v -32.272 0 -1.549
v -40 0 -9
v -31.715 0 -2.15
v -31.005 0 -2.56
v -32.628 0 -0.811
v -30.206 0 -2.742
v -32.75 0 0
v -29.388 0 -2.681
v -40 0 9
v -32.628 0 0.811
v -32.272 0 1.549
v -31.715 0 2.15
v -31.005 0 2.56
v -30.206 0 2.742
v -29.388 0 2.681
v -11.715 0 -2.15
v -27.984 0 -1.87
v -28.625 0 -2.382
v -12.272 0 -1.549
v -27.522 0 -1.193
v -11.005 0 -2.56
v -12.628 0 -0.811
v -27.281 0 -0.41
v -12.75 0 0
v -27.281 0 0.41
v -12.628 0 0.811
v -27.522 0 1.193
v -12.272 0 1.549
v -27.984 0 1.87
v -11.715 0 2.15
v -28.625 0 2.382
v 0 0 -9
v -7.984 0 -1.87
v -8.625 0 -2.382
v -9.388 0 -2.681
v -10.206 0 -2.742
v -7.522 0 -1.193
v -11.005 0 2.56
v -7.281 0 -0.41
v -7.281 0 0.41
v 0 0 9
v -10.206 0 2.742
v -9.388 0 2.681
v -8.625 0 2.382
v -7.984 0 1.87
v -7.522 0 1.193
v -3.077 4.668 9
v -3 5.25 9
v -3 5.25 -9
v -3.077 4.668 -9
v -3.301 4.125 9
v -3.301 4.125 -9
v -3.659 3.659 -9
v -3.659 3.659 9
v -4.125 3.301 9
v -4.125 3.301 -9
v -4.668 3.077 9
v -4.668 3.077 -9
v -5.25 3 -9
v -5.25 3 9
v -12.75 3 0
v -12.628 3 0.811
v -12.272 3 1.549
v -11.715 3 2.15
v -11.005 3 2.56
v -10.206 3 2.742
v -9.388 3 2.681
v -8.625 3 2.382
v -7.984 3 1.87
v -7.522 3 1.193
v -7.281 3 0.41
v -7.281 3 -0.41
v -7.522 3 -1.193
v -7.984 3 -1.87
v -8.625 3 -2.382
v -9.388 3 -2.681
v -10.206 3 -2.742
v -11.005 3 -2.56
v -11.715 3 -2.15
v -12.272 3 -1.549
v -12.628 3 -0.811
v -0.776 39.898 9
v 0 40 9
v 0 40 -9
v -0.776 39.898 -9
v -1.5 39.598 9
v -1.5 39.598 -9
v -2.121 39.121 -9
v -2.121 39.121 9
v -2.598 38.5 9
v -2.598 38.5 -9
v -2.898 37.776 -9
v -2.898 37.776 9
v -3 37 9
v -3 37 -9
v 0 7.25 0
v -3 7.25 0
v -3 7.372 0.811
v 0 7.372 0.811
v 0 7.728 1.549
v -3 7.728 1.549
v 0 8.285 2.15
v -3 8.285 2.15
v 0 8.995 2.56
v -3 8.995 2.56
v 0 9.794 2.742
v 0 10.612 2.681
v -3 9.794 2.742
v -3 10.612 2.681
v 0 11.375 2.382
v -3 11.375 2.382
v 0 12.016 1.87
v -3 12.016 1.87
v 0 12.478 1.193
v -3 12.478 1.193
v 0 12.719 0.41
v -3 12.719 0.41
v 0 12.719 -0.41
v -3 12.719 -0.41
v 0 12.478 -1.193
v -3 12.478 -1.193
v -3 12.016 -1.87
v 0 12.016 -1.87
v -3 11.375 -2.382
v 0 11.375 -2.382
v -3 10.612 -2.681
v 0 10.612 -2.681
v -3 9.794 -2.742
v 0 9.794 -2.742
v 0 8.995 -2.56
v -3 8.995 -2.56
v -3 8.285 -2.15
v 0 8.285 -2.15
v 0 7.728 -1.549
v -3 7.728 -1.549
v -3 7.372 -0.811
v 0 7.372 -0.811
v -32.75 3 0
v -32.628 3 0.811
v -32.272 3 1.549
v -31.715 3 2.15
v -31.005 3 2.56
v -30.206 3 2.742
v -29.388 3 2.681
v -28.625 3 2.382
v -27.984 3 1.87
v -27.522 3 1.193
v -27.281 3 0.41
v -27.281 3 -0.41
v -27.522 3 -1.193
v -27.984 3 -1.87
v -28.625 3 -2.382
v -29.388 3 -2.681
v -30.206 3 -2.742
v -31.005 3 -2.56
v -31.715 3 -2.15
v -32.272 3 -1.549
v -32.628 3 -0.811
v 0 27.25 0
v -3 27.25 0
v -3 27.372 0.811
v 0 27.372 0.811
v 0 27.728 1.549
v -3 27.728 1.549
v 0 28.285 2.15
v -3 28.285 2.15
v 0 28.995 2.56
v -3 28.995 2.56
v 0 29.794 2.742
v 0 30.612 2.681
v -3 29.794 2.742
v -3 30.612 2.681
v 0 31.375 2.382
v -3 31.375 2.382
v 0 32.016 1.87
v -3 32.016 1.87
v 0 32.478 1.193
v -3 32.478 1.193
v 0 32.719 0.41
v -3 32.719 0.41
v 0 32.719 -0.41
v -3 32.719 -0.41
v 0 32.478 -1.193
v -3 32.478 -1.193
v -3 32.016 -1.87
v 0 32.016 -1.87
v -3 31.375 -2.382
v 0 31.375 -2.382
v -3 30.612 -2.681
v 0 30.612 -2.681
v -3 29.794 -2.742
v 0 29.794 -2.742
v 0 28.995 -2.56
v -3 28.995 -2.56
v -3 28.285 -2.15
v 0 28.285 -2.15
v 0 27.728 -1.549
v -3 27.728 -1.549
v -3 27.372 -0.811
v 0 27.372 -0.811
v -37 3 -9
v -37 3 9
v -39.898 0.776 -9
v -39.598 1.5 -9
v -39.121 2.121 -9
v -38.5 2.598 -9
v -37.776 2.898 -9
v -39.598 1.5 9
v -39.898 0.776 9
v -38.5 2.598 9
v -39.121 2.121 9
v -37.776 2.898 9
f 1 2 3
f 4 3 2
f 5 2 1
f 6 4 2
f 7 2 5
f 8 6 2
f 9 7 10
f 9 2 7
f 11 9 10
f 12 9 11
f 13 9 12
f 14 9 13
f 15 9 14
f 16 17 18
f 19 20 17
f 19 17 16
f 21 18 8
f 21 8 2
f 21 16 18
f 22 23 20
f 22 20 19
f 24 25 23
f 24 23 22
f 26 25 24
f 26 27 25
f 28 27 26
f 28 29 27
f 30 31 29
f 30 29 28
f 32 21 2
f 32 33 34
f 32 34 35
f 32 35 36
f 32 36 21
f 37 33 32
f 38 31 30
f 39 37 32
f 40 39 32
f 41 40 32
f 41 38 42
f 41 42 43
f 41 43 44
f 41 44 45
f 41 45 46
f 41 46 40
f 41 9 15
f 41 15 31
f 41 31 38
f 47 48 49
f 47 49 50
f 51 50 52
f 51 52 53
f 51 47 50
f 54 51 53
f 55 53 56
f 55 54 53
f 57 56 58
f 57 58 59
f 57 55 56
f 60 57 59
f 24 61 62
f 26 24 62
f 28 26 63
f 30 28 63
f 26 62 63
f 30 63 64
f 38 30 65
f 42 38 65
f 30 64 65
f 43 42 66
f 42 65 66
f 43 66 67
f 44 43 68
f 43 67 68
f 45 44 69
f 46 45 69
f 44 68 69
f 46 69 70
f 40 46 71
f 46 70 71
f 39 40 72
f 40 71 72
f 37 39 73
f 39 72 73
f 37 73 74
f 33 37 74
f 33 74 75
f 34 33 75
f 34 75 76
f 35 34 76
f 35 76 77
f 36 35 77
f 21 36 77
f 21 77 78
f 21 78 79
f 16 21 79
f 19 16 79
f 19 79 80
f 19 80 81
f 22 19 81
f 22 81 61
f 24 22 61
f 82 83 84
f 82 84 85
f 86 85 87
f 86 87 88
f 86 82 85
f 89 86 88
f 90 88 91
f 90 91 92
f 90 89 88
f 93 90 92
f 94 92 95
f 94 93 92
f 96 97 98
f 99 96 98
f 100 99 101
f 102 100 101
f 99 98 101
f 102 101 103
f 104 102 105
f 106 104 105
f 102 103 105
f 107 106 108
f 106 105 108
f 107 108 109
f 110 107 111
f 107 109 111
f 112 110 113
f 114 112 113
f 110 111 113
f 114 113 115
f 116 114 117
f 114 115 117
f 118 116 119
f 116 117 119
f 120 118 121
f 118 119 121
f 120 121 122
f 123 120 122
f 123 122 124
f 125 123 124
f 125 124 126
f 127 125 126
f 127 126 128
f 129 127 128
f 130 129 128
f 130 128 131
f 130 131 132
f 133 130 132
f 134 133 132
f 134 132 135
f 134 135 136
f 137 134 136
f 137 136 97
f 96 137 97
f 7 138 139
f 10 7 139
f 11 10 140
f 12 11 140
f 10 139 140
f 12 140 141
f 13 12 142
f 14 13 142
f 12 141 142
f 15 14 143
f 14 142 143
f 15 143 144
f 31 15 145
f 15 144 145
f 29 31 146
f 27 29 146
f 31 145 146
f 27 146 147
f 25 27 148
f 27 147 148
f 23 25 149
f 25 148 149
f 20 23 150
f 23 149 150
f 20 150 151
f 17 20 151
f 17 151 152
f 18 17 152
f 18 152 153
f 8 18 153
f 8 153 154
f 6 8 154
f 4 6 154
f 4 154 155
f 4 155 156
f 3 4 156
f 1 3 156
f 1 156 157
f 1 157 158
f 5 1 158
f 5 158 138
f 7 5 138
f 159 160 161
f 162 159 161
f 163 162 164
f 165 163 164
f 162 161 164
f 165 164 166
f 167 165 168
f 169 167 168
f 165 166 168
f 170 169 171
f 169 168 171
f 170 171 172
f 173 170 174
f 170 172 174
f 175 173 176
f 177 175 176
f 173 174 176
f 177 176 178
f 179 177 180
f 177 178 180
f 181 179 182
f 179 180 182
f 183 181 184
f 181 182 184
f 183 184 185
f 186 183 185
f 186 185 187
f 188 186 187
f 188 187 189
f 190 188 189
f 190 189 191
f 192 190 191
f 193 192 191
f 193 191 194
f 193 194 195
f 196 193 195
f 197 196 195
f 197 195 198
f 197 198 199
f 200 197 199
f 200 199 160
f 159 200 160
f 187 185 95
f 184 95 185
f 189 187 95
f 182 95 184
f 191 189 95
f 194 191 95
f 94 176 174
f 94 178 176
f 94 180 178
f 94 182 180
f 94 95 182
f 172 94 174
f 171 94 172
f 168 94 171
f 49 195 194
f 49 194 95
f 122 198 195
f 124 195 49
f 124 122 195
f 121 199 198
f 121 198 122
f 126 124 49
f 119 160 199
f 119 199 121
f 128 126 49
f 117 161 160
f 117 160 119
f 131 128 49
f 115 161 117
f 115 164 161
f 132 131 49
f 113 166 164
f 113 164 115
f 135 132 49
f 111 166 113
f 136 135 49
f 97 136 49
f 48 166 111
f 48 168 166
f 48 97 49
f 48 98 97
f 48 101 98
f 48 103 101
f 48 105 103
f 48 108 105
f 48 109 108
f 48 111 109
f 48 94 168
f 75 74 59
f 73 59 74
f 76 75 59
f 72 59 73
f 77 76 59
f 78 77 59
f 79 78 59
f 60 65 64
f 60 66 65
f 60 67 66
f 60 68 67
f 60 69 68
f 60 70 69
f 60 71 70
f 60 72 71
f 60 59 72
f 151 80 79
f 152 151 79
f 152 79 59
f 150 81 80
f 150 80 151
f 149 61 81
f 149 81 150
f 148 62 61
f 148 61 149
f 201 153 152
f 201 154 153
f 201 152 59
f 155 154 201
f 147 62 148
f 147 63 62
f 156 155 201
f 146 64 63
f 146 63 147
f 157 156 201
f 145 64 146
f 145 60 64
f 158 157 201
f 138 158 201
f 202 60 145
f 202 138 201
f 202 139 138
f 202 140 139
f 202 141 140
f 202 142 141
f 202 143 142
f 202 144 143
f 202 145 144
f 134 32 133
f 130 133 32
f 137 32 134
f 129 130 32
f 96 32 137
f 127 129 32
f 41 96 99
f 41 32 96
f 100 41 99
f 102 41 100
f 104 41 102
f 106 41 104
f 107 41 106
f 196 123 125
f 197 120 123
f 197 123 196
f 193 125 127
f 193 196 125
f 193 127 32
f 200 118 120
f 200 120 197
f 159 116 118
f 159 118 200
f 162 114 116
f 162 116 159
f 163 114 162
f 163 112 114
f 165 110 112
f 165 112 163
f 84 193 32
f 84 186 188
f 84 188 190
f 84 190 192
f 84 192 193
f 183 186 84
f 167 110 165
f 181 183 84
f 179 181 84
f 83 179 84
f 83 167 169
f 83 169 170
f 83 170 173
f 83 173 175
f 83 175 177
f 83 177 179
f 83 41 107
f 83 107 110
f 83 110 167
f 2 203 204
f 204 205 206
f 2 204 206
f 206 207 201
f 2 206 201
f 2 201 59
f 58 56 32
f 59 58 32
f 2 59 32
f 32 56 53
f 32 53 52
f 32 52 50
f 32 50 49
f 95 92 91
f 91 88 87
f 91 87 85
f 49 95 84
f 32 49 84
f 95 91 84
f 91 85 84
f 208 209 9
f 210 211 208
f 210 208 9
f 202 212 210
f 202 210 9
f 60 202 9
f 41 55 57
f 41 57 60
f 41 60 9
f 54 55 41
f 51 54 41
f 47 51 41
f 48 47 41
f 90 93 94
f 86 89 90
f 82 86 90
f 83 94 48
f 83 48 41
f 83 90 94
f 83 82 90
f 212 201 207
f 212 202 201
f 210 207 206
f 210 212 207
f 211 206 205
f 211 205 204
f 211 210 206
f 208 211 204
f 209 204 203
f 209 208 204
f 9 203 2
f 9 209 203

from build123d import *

# Parameters (mm, degrees)
EXTRUDE1_DEPTH     = 9
SKETCH4_R          = 2.75
CUT_EXTRUDE3_DEPTH = 56.226805086
SKETCH5_R          = 2.75
CUT_EXTRUDE4_DEPTH = 56.226805086


with BuildPart() as part:
    # Sketch1 → Extrude1 (new, symmetric)
    with BuildSketch(Plane.XY):
        with BuildLine():
            Line((0, 0), (0, 40))
            ThreePointArc((0, 40), (-2.121320344, 39.121320344), (-3, 37))
            Line((-3, 37), (-3, 5.25))
            ThreePointArc((-3, 5.25), (-3.659009742, 3.659009742), (-5.25, 3))
            Line((-5.25, 3), (-37, 3))
            ThreePointArc((-37, 3), (-39.121320344, 2.121320344), (-40, 0))
            Line((-40, 0), (0, 0))
        make_face()
    extrude(amount=EXTRUDE1_DEPTH, both=True)

    # Sketch4 → Cut-Extrude3 (cut, through all)
    with BuildSketch(Plane(origin=(0, 3, 0), x_dir=(1, 0, 0), z_dir=(0, 1, 0))):
        with Locations(Location((-10, 0, 0), (0, 0, 180))):
            Circle(SKETCH4_R)
        with Locations(Location((-30, 0, 0), (0, 0, 180))):
            Circle(SKETCH4_R)
    extrude(amount=-CUT_EXTRUDE3_DEPTH, mode=Mode.SUBTRACT)

    # Sketch5 → Cut-Extrude4 (cut, through all)
    with BuildSketch(Plane.ZY.offset(3)):
        with Locations(Location((0, 30, 0), (0, 0, 270))):
            Circle(SKETCH5_R)
        with Locations(Location((0, 10, 0), (0, 0, 270))):
            Circle(SKETCH5_R)
    extrude(amount=-CUT_EXTRUDE4_DEPTH, mode=Mode.SUBTRACT)


solid = part.part
